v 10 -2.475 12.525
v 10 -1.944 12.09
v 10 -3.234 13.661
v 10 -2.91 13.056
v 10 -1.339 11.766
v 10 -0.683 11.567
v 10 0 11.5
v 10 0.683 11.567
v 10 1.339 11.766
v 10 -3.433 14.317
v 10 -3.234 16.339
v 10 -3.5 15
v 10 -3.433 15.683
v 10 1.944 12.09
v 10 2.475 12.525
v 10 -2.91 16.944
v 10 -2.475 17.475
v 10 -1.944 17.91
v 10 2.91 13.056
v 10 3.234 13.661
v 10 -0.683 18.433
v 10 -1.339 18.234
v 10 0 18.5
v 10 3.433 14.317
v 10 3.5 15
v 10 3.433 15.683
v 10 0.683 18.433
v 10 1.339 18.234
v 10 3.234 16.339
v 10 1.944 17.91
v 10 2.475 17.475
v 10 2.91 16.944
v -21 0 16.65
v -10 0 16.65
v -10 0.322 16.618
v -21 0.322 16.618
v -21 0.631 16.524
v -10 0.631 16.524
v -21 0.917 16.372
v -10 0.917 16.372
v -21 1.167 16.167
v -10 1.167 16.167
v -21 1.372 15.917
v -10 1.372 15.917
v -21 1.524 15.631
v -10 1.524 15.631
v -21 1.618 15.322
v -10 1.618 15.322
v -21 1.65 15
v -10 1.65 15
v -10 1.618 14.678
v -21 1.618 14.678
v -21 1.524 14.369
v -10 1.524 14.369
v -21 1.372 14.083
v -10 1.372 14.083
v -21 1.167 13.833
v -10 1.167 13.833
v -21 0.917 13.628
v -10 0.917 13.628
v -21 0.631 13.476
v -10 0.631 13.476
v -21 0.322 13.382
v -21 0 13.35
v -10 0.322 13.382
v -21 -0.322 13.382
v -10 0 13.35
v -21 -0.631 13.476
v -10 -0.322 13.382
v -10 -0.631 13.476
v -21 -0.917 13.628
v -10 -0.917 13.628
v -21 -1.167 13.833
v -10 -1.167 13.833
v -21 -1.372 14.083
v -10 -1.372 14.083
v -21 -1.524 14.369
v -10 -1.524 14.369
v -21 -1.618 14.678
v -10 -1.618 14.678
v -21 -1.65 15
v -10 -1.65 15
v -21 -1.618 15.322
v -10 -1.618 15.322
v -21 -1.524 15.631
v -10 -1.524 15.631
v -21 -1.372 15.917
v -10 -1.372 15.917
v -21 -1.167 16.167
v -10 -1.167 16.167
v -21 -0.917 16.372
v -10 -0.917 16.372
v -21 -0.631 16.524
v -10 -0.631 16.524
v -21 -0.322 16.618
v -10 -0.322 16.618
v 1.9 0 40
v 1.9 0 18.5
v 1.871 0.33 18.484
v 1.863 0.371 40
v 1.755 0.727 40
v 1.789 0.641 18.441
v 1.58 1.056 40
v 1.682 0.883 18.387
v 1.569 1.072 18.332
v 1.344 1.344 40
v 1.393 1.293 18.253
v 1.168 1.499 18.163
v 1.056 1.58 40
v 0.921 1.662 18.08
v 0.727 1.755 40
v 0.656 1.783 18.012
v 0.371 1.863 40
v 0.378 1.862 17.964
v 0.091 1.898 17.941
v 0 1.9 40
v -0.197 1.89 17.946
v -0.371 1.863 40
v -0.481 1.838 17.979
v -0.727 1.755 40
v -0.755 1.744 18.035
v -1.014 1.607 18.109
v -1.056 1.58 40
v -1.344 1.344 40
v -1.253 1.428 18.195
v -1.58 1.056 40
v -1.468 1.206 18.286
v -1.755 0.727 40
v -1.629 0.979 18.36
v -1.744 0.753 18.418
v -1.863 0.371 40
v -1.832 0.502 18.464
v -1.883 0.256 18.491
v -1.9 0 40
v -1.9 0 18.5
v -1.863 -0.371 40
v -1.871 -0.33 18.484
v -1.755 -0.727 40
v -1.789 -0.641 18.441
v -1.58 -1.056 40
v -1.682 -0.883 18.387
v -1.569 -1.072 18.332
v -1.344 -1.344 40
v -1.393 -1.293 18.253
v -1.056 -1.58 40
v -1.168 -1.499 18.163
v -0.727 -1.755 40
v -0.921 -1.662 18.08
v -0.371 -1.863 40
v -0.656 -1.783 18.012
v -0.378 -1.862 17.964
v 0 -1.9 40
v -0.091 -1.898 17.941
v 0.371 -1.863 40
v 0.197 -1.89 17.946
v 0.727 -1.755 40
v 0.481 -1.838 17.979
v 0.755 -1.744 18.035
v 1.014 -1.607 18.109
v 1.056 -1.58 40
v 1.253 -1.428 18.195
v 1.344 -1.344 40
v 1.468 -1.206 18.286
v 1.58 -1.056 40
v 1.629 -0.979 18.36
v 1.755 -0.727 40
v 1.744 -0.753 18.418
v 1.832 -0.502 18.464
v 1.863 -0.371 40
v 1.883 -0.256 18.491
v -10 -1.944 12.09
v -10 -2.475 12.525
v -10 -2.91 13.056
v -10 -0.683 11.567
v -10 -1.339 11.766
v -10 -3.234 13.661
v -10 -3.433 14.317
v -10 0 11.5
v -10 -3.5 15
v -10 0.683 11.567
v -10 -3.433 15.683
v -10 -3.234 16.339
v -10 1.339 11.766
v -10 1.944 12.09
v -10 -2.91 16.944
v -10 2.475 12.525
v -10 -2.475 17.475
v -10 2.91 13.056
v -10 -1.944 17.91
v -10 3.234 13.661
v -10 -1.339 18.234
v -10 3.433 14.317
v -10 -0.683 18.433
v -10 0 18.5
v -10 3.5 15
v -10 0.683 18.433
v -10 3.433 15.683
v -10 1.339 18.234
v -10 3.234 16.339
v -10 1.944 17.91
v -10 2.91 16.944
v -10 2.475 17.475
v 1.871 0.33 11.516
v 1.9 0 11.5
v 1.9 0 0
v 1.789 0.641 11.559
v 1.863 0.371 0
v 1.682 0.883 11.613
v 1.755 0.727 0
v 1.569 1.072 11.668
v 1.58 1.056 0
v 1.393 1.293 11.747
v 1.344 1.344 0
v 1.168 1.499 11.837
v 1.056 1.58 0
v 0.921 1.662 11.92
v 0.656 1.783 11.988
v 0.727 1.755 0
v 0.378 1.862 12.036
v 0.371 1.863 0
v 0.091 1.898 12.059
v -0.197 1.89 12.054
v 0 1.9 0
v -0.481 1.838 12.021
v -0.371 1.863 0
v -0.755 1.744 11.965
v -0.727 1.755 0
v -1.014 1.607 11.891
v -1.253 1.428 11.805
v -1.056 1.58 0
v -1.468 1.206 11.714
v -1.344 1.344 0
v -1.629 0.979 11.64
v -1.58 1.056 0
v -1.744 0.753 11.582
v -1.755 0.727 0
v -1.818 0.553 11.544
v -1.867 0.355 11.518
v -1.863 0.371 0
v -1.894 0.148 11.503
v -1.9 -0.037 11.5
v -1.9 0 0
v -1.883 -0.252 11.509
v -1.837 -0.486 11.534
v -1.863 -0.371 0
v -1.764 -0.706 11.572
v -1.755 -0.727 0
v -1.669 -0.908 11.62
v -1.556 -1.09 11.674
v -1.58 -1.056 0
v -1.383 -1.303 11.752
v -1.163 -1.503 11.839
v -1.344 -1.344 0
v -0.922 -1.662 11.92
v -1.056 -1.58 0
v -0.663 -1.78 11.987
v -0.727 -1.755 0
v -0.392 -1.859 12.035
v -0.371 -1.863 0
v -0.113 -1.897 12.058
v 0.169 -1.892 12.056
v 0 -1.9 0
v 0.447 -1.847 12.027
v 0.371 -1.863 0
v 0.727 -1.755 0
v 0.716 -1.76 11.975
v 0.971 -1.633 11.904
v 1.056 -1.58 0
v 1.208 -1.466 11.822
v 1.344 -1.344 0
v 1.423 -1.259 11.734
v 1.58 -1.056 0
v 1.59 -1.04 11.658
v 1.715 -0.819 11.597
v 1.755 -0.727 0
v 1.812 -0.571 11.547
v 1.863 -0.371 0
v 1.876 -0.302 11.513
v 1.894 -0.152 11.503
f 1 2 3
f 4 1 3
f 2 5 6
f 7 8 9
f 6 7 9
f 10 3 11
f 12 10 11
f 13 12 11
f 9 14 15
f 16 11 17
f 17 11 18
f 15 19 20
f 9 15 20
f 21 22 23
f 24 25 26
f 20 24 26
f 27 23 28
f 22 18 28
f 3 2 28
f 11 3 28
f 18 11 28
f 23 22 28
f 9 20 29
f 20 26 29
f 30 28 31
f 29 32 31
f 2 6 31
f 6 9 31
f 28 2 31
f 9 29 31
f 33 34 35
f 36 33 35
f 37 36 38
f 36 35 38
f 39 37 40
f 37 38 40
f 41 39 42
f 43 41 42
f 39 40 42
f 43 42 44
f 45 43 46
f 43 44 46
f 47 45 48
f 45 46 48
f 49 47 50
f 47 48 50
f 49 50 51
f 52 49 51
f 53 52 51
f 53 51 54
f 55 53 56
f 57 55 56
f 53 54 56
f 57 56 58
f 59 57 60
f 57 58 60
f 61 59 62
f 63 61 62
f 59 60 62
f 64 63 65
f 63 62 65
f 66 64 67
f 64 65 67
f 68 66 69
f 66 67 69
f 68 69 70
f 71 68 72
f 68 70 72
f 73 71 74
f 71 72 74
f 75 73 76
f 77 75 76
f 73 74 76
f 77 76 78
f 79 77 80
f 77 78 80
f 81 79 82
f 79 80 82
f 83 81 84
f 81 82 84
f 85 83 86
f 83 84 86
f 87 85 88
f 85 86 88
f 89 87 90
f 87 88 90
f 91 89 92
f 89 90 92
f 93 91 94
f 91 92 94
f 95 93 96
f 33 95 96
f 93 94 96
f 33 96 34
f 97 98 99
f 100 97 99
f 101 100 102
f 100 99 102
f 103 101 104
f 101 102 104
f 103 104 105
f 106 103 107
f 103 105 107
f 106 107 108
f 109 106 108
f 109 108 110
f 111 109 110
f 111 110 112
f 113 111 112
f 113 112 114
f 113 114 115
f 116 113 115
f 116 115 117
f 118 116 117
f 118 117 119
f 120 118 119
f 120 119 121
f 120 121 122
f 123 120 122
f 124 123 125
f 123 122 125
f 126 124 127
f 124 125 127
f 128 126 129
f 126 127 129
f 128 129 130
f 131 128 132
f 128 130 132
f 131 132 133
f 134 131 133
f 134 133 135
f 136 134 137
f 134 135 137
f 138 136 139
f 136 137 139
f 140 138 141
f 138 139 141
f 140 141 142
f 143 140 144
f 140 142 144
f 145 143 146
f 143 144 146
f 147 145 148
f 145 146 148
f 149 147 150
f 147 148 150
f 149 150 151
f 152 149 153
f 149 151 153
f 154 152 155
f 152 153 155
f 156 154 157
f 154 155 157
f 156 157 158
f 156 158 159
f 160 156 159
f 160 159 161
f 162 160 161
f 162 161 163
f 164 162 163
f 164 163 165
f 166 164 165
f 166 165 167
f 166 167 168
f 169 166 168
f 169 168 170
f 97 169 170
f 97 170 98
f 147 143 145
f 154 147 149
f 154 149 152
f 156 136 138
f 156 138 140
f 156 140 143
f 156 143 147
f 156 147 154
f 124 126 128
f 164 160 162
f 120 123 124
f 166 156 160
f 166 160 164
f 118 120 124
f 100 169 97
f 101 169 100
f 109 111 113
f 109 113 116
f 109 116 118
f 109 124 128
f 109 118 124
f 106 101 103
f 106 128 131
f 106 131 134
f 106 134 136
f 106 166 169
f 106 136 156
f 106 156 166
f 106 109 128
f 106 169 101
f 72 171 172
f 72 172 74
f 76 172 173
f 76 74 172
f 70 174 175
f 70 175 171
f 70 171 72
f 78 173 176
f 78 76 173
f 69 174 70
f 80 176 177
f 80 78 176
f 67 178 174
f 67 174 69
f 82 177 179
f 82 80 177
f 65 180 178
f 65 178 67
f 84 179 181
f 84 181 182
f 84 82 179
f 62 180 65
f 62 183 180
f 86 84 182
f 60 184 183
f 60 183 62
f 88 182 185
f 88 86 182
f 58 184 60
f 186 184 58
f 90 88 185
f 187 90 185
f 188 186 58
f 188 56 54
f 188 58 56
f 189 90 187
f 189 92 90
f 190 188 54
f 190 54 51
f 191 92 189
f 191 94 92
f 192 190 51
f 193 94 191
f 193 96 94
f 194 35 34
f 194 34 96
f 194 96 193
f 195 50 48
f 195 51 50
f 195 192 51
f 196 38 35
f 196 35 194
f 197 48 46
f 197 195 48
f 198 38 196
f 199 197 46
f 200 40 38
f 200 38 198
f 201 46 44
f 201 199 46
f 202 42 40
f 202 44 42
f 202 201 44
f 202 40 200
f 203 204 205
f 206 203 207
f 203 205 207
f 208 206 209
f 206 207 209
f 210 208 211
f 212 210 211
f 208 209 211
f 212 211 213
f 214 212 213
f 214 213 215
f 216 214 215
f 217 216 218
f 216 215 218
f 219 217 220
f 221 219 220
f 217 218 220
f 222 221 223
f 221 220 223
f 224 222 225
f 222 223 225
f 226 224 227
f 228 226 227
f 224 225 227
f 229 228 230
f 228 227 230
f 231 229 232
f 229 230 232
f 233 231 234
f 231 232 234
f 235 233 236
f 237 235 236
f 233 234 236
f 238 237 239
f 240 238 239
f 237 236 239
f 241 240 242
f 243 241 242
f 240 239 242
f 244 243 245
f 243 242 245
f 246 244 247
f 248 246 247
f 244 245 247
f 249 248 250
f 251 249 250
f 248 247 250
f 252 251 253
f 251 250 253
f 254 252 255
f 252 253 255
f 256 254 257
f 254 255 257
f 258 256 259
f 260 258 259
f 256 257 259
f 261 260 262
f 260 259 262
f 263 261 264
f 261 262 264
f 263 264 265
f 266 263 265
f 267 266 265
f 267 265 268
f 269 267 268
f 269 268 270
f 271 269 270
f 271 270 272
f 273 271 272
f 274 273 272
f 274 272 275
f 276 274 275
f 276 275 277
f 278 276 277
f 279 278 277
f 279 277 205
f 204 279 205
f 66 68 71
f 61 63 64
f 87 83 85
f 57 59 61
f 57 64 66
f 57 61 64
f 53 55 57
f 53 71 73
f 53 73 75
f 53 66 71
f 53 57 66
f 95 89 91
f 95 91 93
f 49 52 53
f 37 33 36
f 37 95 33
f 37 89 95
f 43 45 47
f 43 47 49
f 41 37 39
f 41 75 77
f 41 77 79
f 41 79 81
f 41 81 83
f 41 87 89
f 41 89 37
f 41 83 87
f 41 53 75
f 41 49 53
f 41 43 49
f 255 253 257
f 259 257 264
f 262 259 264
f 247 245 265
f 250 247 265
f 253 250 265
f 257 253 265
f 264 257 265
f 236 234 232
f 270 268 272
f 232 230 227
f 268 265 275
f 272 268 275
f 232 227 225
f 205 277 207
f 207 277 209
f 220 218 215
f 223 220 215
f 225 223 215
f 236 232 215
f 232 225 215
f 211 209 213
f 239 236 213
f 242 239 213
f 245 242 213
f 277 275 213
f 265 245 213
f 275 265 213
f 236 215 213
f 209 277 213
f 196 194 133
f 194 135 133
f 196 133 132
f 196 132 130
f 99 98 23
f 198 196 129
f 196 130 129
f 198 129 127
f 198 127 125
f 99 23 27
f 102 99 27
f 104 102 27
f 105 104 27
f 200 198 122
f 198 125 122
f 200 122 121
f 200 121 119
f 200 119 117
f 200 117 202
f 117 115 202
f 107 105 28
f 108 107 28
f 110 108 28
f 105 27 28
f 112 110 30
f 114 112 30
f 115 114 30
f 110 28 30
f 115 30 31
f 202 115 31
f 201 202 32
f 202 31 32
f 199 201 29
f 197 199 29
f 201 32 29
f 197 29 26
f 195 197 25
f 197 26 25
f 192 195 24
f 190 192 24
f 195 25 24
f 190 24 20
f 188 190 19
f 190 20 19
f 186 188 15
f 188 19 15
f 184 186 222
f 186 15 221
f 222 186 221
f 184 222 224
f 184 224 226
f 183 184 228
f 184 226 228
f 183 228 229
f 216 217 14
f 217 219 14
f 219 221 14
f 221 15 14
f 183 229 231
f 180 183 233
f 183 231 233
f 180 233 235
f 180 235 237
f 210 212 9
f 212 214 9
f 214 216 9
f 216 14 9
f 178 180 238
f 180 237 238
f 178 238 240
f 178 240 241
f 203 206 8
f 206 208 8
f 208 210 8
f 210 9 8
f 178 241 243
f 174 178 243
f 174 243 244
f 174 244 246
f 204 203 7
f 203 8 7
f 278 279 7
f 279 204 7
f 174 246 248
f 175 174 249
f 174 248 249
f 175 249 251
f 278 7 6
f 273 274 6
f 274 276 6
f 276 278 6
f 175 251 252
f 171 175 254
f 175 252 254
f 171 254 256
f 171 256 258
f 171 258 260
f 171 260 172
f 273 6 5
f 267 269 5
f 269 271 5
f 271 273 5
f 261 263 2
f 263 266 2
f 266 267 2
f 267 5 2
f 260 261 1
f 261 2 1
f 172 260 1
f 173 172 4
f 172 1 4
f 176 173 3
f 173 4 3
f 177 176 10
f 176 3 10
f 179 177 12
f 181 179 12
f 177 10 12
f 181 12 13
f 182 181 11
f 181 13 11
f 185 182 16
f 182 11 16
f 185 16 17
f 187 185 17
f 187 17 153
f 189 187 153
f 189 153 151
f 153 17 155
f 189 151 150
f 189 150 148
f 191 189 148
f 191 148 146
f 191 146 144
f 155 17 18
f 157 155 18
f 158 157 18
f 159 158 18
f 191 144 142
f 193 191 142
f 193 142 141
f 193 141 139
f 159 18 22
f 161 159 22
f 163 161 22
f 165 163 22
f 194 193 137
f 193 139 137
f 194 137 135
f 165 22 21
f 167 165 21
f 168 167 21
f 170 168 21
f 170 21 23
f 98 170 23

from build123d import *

# Parameters (mm, degrees)
CYLINDER001_R     = 1.65
CYLINDER001_DEPTH = 11
CYLINDER_R        = 3.5
CYLINDER_DEPTH    = 20
CYLINDER002_R     = 1.9
CYLINDER002_DEPTH = 40


with BuildPart() as cylinder001:
    # Cylinder001 → Cylinder001 (new body)
    with BuildSketch(Plane(origin=(-10, 0, 15), x_dir=(0, 0, 1), z_dir=(-1, 0, 0))):
        Circle(CYLINDER001_R)
    extrude(amount=CYLINDER001_DEPTH)


with BuildPart() as cylinder:
    # Cylinder → Cylinder (new body)
    with BuildSketch(Plane(origin=(10, 0, 15), x_dir=(0, 0, 1), z_dir=(-1, 0, 0))):
        Circle(CYLINDER_R)
    extrude(amount=CYLINDER_DEPTH)


with BuildPart() as bolt_slot:
    # Cylinder002 → Cylinder002 (new body)
    with BuildSketch(Plane.XY):
        Circle(CYLINDER002_R)
    extrude(amount=CYLINDER002_DEPTH)

    # Fusion001010002: union Cylinder001, Cylinder
    add(cylinder001.part)
    add(cylinder.part)


solid = bolt_slot.part
